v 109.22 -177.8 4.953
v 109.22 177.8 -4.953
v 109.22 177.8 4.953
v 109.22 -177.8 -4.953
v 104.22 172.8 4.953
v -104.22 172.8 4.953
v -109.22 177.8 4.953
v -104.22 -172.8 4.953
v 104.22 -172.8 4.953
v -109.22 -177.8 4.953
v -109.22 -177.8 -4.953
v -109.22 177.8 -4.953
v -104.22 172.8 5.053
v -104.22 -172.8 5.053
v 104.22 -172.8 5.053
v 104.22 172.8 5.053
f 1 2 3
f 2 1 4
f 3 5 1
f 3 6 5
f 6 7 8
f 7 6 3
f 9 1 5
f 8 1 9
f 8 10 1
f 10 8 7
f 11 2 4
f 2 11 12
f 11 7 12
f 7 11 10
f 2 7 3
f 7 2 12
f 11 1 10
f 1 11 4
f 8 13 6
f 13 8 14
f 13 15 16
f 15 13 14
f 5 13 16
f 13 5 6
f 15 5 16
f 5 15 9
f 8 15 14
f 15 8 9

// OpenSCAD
module monitor(){
    module monitor_cm(){
        total_dims = [21.844, 35.56, 0.9906];
        screen_dims = [total_dims[0]-1, total_dims[1]-1];
        color("LightBlue", 1.0)cube(total_dims, center=true);
        color("blue", 1.0)translate([0,0, total_dims[2]/2])linear_extrude(height=0.01)square(screen_dims, center=true);   
    }
    scale([10,10,10])monitor_cm();
}
monitor();
